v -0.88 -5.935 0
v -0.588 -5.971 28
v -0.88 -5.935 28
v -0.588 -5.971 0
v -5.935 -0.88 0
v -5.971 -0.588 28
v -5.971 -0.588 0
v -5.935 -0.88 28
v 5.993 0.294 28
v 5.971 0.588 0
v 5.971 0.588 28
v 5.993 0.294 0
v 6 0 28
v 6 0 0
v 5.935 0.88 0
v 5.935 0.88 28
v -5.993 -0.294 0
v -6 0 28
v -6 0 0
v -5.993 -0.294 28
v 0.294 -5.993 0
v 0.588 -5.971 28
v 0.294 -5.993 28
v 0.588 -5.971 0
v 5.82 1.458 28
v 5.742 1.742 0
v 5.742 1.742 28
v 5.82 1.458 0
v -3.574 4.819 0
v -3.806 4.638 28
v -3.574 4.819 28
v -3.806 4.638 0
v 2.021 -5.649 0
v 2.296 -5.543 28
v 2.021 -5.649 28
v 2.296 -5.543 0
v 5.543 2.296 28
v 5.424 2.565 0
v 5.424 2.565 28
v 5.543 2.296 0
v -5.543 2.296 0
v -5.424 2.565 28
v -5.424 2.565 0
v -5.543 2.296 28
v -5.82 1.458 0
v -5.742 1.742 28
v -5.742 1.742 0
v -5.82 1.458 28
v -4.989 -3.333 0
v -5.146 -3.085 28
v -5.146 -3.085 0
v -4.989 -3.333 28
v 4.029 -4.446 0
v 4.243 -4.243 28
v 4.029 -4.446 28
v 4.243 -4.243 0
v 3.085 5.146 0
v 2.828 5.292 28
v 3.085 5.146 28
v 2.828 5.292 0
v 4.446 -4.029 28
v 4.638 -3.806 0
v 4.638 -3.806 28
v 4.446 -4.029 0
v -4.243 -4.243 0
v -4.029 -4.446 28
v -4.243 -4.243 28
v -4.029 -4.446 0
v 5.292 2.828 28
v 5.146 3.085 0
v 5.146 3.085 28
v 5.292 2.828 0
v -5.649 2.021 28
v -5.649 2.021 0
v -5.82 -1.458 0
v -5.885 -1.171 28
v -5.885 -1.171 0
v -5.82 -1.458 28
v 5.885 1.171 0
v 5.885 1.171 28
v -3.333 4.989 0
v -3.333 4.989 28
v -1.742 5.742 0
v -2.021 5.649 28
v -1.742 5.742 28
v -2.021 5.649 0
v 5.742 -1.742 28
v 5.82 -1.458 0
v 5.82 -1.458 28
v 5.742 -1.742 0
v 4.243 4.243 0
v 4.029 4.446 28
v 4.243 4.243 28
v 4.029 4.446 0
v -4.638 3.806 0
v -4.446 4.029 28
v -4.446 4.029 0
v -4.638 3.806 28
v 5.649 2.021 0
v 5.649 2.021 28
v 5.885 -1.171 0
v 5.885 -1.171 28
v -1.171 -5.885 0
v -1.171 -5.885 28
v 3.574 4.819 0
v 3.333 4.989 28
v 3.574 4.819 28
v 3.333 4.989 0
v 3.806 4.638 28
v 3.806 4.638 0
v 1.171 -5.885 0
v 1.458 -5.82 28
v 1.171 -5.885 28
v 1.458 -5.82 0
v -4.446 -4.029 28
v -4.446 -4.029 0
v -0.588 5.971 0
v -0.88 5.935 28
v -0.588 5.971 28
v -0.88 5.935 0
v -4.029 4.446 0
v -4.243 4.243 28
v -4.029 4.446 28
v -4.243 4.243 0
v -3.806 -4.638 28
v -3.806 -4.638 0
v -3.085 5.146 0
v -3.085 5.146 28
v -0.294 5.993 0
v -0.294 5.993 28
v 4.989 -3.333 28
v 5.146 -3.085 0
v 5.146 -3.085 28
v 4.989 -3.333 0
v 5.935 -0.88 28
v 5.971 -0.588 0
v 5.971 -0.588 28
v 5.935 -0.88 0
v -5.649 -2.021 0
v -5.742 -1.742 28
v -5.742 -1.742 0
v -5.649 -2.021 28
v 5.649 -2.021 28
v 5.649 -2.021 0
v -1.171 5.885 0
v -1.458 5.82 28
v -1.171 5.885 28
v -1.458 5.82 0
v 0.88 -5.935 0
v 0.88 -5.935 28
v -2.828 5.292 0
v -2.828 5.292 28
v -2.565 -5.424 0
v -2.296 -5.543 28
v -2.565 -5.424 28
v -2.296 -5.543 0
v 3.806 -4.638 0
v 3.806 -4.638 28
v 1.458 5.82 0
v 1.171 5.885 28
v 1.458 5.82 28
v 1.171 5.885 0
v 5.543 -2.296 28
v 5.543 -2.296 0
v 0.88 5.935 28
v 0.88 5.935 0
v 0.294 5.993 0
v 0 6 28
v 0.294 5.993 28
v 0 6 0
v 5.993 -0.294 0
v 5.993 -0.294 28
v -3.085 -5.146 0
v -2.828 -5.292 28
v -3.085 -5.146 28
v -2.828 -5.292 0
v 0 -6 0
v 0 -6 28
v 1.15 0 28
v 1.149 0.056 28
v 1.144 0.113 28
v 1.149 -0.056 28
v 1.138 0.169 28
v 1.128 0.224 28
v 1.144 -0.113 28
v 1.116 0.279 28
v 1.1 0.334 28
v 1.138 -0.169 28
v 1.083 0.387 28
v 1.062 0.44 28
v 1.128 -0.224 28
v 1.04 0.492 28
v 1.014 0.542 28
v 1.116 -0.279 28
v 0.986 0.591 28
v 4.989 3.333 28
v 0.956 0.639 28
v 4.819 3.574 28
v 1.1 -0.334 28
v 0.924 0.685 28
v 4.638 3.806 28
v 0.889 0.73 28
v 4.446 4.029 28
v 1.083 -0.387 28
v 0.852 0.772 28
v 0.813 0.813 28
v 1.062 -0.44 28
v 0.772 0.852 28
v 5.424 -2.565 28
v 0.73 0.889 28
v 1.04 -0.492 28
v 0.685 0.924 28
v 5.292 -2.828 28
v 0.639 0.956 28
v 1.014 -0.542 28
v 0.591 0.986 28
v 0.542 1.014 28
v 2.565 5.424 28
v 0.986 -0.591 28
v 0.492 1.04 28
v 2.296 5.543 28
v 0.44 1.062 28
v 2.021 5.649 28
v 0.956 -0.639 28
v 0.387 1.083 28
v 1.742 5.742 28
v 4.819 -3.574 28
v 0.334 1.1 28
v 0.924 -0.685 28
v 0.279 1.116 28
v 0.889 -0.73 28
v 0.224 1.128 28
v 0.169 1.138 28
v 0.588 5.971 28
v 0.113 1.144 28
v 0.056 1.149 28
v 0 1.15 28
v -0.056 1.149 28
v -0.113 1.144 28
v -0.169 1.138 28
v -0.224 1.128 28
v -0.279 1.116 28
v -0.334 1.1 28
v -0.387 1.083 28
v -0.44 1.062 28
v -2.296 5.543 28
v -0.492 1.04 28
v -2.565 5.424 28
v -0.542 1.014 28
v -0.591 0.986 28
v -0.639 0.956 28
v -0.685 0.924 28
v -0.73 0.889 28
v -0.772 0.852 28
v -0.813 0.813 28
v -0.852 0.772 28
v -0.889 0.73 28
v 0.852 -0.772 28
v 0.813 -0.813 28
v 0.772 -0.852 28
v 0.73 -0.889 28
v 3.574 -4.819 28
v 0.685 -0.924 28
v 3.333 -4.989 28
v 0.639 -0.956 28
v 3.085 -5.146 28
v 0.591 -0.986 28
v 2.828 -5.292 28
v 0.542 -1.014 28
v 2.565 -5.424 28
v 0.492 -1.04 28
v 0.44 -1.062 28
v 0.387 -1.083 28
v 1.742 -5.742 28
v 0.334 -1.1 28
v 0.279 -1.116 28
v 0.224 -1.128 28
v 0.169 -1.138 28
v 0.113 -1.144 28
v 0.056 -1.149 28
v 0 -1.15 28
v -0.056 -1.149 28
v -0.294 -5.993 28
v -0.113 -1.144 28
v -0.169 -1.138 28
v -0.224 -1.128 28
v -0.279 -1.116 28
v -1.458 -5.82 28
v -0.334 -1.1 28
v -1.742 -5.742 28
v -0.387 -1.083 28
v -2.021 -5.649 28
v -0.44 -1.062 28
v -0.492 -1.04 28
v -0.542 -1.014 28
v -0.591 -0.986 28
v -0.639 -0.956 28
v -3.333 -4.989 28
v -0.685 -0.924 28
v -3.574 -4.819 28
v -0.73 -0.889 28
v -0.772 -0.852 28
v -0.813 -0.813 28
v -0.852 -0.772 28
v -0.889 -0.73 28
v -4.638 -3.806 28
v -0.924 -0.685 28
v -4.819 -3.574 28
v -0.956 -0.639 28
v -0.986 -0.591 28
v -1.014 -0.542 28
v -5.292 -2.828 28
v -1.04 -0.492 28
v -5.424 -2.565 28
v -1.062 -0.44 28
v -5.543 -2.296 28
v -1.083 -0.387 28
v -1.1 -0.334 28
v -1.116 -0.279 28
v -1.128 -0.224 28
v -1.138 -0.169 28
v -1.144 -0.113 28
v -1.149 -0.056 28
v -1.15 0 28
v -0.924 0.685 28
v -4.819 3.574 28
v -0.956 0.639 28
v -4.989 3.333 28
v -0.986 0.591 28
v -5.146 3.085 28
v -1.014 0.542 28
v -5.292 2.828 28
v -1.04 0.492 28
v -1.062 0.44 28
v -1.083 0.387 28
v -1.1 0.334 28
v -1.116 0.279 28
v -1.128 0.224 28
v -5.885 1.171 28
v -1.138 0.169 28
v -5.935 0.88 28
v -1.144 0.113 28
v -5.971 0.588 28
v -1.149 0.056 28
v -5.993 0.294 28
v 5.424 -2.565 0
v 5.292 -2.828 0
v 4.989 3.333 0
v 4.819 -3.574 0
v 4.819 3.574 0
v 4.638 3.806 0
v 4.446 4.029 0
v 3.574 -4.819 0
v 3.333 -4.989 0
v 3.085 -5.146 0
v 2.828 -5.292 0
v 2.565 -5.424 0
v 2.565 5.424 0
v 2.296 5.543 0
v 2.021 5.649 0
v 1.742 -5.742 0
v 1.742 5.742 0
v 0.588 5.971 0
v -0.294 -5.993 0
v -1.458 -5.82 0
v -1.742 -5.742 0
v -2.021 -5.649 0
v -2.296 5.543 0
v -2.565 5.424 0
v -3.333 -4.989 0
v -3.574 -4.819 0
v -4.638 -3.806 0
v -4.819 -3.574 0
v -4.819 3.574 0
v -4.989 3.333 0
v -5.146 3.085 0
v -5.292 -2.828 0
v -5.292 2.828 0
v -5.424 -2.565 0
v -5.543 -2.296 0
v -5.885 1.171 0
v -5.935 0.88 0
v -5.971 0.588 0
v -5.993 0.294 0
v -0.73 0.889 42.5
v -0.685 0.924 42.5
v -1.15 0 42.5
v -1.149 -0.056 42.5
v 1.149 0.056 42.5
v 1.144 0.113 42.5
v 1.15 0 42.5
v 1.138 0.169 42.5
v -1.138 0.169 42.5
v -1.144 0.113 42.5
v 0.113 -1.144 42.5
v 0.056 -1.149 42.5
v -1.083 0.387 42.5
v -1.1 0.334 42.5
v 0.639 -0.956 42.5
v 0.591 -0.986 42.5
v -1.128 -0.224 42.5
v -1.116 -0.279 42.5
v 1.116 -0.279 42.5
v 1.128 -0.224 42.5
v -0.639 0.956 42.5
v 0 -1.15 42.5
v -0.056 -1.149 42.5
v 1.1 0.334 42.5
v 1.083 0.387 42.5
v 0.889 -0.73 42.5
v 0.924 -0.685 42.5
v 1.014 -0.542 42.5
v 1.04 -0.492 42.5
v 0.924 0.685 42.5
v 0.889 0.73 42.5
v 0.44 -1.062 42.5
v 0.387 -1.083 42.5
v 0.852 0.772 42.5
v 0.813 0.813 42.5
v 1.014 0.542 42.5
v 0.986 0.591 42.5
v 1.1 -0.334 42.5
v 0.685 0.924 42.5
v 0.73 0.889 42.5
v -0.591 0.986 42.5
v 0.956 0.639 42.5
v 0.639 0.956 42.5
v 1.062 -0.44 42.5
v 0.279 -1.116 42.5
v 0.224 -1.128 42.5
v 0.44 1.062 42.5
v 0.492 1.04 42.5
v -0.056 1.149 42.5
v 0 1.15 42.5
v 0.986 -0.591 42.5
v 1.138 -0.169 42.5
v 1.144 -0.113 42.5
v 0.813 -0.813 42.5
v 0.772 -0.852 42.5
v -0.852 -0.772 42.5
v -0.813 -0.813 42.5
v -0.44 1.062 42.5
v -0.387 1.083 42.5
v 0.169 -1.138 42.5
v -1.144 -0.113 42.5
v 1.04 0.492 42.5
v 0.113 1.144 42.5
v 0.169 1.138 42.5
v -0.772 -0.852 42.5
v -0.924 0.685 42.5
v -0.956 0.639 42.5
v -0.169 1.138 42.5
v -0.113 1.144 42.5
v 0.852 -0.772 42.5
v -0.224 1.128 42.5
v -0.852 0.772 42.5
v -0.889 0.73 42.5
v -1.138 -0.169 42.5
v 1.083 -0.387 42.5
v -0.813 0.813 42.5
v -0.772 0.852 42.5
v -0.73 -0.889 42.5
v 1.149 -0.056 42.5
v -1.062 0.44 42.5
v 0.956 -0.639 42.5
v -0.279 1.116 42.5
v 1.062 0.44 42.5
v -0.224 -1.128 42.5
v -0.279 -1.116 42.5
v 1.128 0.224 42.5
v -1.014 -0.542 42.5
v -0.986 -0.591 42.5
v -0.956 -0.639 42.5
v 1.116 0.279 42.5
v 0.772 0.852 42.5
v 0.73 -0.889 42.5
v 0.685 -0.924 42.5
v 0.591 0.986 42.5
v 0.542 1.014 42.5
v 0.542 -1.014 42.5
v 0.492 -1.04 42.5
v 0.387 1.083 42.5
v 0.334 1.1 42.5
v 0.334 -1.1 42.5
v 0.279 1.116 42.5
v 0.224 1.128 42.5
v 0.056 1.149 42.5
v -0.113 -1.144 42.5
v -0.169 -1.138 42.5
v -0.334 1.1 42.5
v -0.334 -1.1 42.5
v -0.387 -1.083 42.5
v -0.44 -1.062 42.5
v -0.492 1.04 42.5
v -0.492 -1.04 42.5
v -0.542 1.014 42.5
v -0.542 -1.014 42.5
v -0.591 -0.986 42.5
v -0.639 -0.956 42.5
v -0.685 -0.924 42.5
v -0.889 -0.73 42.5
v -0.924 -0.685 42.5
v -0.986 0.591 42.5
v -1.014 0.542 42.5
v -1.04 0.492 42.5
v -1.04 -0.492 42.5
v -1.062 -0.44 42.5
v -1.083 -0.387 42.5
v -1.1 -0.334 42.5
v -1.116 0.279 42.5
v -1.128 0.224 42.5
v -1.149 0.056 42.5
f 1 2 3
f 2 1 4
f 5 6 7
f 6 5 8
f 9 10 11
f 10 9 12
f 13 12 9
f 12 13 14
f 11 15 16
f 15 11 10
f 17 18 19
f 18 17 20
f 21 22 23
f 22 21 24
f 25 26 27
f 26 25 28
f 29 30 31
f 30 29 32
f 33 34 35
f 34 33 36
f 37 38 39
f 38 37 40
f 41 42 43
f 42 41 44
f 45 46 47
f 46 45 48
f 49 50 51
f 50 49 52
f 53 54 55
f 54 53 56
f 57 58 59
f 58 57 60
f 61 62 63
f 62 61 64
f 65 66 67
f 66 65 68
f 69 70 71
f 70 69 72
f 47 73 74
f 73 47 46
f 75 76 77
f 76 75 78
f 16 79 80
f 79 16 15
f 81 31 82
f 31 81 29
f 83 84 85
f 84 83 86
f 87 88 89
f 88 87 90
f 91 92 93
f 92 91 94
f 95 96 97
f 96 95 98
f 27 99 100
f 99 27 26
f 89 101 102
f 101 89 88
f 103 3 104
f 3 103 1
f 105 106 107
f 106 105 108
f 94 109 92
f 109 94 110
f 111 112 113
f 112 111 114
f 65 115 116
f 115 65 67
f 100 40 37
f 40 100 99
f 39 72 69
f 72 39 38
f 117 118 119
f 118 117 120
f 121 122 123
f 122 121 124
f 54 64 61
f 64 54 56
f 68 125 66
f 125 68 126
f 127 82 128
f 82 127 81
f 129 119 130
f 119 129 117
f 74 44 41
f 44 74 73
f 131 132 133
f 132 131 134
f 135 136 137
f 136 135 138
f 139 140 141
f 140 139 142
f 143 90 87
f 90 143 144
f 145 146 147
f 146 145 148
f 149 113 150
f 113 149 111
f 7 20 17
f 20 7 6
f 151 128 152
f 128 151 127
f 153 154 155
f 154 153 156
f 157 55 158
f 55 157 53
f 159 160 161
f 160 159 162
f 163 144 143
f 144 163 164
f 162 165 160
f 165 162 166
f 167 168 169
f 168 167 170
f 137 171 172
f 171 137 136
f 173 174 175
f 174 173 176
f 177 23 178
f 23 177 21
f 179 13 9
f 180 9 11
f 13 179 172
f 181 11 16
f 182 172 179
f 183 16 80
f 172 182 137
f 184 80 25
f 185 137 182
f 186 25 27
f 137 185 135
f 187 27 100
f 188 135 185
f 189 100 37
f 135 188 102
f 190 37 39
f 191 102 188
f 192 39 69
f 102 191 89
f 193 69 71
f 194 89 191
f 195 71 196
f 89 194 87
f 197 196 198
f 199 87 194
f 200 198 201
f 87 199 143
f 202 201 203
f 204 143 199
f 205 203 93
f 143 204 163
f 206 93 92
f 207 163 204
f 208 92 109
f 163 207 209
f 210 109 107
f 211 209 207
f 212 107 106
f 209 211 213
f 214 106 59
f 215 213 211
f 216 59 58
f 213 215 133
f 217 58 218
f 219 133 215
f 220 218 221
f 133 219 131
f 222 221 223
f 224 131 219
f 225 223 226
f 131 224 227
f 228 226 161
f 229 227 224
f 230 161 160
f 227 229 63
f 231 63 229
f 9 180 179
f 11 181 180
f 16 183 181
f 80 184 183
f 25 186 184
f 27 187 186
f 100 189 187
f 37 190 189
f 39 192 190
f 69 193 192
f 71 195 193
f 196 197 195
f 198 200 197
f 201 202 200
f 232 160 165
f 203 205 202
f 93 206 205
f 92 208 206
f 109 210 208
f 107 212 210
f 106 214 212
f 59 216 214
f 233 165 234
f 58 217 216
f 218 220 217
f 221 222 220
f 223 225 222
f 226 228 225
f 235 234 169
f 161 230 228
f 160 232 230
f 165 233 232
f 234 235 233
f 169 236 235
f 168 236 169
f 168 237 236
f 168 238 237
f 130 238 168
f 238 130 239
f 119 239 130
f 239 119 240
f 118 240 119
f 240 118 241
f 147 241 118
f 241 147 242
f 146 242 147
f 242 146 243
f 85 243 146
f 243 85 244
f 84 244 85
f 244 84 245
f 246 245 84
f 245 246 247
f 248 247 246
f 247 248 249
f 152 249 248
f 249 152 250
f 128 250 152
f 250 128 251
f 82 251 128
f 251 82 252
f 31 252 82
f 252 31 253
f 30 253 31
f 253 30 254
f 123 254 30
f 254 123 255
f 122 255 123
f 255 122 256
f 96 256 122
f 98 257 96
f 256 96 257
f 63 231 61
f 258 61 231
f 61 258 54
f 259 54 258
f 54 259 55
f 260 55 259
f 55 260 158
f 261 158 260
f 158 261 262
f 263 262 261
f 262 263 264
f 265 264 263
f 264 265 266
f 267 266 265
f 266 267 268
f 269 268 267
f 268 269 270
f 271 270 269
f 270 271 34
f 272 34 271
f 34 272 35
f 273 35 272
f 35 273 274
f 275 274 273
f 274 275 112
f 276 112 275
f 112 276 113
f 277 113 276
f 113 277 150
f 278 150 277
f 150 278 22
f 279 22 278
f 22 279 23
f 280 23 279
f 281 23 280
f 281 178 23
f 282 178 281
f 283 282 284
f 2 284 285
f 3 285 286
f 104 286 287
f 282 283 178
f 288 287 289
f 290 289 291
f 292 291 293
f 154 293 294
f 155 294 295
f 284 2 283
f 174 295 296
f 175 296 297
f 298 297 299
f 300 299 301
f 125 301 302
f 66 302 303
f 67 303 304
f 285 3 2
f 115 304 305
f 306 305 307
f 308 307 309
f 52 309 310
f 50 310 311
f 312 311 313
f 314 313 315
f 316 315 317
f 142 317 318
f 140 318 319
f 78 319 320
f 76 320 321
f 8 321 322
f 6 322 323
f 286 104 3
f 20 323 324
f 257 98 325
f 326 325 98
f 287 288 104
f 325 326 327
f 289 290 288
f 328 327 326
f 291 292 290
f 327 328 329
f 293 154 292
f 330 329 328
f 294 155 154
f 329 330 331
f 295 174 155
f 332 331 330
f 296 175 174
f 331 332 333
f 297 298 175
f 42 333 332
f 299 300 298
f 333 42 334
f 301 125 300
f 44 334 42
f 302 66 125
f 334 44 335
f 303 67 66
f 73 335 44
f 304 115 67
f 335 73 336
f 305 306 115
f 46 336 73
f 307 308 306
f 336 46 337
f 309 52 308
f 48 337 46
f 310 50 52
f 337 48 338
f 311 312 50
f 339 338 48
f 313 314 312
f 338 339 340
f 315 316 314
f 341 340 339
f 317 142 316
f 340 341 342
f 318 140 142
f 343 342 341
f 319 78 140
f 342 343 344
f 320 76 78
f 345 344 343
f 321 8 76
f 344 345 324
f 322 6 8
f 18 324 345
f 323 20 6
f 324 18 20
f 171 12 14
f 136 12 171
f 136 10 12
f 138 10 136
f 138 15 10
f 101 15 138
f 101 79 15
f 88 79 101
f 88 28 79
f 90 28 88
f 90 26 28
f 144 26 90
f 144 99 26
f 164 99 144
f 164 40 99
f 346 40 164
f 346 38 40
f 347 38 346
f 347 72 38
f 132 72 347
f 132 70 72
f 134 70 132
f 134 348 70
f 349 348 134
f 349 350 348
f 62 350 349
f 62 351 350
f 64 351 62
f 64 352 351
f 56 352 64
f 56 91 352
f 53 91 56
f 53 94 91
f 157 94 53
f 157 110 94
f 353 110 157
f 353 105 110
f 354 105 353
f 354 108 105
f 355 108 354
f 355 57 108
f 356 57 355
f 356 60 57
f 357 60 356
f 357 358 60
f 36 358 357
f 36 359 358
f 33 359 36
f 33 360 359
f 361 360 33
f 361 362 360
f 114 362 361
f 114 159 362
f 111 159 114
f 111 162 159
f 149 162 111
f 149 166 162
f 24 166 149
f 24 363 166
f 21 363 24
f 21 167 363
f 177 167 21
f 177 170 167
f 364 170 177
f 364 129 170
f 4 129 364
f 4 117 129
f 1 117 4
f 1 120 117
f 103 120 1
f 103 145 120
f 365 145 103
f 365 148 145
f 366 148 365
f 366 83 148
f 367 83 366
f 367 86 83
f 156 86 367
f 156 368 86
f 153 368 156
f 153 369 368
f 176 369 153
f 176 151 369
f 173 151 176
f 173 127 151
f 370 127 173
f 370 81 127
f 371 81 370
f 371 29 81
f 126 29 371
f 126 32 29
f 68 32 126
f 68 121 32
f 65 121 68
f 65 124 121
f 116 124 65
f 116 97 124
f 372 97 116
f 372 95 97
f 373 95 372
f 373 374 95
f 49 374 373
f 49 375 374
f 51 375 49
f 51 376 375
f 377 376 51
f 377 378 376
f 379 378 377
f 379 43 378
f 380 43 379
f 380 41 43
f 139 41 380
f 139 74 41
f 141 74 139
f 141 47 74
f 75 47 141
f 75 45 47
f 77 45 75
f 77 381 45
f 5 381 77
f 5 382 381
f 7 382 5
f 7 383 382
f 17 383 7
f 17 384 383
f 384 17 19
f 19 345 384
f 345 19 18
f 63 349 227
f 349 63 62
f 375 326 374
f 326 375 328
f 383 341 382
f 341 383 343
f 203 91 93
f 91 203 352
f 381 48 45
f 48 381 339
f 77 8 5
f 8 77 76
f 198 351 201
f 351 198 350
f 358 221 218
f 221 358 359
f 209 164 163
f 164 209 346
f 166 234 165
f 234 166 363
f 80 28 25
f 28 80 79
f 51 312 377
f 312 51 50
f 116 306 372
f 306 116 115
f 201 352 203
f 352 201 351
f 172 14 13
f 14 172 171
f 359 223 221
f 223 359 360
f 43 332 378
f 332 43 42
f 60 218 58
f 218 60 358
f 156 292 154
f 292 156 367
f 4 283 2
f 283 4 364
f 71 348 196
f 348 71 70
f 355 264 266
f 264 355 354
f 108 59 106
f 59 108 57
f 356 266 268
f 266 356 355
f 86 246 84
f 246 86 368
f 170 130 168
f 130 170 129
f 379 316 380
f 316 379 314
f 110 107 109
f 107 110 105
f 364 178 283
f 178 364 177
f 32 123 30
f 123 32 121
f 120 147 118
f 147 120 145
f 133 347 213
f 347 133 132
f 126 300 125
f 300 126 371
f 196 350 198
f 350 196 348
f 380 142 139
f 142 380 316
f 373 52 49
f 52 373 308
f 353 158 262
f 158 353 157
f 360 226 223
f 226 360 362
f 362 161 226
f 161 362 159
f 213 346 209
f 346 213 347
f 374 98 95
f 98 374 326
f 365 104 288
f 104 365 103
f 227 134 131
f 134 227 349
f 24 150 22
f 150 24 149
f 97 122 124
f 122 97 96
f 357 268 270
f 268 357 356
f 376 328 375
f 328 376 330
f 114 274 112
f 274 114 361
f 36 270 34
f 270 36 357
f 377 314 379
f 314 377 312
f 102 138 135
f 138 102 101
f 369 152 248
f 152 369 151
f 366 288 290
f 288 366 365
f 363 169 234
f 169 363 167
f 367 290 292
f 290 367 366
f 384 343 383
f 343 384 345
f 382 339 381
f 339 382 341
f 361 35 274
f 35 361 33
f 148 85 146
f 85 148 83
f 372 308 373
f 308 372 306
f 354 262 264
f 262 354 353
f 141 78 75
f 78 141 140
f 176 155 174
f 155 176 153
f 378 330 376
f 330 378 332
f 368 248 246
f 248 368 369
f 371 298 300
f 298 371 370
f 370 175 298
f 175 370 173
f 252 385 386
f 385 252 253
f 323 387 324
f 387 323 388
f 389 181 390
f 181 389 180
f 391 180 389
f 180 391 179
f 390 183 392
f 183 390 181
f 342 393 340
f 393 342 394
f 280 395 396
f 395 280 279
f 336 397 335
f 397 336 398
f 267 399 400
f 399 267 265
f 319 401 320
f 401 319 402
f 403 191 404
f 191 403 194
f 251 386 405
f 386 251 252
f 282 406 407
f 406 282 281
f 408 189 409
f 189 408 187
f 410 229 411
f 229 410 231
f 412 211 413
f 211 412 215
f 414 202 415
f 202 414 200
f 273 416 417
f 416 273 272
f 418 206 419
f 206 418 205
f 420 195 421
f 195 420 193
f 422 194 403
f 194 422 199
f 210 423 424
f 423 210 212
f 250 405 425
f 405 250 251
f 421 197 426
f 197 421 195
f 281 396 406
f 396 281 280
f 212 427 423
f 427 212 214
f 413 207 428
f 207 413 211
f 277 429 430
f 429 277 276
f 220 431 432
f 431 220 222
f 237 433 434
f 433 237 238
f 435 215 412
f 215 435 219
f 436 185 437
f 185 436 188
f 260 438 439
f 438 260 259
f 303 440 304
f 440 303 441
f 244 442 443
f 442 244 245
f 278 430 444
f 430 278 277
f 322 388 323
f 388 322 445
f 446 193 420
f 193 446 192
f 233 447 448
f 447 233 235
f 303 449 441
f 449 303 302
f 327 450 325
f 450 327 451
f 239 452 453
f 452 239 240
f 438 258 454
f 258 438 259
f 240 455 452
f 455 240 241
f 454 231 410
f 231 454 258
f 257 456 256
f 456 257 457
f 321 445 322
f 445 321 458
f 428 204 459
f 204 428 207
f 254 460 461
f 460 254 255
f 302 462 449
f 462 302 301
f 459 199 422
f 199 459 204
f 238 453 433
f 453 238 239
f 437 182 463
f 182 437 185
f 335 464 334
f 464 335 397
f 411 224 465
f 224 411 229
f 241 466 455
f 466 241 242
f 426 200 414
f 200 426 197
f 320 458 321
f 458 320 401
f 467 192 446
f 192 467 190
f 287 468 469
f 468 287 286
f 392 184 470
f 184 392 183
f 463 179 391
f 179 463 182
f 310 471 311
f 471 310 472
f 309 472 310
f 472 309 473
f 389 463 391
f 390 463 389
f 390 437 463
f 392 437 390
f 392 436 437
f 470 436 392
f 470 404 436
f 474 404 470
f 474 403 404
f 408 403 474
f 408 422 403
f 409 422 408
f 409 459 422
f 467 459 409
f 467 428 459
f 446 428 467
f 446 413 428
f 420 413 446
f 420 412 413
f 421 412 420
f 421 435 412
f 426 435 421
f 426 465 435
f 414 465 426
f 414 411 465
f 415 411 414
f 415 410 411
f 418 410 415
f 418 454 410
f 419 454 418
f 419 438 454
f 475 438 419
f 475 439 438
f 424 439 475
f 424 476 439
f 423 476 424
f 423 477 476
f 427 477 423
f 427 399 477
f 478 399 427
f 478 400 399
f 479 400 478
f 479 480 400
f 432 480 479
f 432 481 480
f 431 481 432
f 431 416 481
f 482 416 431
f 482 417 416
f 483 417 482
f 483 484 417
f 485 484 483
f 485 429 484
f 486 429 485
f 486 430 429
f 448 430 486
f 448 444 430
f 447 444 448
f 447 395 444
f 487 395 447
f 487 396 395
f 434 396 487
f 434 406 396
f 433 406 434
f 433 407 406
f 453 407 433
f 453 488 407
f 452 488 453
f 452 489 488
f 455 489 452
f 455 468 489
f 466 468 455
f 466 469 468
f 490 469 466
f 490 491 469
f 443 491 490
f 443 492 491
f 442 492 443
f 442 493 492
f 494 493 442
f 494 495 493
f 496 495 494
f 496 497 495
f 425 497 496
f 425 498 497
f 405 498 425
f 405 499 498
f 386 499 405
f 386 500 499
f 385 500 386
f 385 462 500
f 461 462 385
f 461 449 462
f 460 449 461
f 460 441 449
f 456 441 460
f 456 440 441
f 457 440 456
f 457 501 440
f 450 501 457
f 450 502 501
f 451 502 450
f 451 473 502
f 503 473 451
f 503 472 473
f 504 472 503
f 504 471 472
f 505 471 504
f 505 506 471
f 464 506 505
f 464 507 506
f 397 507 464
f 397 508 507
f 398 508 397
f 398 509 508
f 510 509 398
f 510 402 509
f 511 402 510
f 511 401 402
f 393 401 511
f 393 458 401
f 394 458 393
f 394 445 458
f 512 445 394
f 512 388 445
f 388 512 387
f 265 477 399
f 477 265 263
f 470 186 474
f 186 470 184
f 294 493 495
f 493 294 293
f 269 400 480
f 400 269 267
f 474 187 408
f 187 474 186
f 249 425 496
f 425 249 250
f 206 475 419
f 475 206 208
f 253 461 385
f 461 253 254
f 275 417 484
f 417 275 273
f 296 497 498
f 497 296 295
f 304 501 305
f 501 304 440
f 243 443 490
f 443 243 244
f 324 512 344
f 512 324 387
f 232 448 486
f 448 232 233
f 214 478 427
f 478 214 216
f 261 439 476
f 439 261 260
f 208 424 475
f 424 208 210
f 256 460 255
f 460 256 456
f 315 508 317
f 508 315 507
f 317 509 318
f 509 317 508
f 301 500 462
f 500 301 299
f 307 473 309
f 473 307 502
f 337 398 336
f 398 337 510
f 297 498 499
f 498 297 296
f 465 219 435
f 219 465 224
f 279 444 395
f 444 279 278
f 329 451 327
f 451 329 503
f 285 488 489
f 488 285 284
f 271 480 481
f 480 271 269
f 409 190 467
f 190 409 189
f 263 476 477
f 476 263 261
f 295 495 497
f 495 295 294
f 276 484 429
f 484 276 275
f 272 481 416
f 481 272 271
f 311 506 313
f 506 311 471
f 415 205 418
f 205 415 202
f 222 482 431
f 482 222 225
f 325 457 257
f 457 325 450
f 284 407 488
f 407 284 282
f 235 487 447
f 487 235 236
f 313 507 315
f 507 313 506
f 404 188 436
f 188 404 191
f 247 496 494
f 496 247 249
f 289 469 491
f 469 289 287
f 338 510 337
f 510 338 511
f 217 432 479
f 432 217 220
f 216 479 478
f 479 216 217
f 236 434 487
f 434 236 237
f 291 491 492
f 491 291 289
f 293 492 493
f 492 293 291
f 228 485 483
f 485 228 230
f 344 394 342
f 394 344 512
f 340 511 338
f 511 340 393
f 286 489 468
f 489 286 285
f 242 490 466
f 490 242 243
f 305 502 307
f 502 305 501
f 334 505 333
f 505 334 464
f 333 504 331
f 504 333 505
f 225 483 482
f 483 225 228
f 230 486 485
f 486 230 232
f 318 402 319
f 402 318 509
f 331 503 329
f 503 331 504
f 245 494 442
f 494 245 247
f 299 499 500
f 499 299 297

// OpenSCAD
// Dimensions in millimetres; user-authorized fit-selected shaft, original12x28grip.
total_length = 42.5;
shaft_length = 14.5;
shaft_diameter = 2.3;
grip_diameter = 12;
grip_length = total_length - shaft_length;
$fn = 128;
union() {
    cylinder(h = grip_length, d = grip_diameter);
    translate([0, 0, grip_length - 0.01])
        cylinder(h = shaft_length + 0.01, d = shaft_diameter);
}
